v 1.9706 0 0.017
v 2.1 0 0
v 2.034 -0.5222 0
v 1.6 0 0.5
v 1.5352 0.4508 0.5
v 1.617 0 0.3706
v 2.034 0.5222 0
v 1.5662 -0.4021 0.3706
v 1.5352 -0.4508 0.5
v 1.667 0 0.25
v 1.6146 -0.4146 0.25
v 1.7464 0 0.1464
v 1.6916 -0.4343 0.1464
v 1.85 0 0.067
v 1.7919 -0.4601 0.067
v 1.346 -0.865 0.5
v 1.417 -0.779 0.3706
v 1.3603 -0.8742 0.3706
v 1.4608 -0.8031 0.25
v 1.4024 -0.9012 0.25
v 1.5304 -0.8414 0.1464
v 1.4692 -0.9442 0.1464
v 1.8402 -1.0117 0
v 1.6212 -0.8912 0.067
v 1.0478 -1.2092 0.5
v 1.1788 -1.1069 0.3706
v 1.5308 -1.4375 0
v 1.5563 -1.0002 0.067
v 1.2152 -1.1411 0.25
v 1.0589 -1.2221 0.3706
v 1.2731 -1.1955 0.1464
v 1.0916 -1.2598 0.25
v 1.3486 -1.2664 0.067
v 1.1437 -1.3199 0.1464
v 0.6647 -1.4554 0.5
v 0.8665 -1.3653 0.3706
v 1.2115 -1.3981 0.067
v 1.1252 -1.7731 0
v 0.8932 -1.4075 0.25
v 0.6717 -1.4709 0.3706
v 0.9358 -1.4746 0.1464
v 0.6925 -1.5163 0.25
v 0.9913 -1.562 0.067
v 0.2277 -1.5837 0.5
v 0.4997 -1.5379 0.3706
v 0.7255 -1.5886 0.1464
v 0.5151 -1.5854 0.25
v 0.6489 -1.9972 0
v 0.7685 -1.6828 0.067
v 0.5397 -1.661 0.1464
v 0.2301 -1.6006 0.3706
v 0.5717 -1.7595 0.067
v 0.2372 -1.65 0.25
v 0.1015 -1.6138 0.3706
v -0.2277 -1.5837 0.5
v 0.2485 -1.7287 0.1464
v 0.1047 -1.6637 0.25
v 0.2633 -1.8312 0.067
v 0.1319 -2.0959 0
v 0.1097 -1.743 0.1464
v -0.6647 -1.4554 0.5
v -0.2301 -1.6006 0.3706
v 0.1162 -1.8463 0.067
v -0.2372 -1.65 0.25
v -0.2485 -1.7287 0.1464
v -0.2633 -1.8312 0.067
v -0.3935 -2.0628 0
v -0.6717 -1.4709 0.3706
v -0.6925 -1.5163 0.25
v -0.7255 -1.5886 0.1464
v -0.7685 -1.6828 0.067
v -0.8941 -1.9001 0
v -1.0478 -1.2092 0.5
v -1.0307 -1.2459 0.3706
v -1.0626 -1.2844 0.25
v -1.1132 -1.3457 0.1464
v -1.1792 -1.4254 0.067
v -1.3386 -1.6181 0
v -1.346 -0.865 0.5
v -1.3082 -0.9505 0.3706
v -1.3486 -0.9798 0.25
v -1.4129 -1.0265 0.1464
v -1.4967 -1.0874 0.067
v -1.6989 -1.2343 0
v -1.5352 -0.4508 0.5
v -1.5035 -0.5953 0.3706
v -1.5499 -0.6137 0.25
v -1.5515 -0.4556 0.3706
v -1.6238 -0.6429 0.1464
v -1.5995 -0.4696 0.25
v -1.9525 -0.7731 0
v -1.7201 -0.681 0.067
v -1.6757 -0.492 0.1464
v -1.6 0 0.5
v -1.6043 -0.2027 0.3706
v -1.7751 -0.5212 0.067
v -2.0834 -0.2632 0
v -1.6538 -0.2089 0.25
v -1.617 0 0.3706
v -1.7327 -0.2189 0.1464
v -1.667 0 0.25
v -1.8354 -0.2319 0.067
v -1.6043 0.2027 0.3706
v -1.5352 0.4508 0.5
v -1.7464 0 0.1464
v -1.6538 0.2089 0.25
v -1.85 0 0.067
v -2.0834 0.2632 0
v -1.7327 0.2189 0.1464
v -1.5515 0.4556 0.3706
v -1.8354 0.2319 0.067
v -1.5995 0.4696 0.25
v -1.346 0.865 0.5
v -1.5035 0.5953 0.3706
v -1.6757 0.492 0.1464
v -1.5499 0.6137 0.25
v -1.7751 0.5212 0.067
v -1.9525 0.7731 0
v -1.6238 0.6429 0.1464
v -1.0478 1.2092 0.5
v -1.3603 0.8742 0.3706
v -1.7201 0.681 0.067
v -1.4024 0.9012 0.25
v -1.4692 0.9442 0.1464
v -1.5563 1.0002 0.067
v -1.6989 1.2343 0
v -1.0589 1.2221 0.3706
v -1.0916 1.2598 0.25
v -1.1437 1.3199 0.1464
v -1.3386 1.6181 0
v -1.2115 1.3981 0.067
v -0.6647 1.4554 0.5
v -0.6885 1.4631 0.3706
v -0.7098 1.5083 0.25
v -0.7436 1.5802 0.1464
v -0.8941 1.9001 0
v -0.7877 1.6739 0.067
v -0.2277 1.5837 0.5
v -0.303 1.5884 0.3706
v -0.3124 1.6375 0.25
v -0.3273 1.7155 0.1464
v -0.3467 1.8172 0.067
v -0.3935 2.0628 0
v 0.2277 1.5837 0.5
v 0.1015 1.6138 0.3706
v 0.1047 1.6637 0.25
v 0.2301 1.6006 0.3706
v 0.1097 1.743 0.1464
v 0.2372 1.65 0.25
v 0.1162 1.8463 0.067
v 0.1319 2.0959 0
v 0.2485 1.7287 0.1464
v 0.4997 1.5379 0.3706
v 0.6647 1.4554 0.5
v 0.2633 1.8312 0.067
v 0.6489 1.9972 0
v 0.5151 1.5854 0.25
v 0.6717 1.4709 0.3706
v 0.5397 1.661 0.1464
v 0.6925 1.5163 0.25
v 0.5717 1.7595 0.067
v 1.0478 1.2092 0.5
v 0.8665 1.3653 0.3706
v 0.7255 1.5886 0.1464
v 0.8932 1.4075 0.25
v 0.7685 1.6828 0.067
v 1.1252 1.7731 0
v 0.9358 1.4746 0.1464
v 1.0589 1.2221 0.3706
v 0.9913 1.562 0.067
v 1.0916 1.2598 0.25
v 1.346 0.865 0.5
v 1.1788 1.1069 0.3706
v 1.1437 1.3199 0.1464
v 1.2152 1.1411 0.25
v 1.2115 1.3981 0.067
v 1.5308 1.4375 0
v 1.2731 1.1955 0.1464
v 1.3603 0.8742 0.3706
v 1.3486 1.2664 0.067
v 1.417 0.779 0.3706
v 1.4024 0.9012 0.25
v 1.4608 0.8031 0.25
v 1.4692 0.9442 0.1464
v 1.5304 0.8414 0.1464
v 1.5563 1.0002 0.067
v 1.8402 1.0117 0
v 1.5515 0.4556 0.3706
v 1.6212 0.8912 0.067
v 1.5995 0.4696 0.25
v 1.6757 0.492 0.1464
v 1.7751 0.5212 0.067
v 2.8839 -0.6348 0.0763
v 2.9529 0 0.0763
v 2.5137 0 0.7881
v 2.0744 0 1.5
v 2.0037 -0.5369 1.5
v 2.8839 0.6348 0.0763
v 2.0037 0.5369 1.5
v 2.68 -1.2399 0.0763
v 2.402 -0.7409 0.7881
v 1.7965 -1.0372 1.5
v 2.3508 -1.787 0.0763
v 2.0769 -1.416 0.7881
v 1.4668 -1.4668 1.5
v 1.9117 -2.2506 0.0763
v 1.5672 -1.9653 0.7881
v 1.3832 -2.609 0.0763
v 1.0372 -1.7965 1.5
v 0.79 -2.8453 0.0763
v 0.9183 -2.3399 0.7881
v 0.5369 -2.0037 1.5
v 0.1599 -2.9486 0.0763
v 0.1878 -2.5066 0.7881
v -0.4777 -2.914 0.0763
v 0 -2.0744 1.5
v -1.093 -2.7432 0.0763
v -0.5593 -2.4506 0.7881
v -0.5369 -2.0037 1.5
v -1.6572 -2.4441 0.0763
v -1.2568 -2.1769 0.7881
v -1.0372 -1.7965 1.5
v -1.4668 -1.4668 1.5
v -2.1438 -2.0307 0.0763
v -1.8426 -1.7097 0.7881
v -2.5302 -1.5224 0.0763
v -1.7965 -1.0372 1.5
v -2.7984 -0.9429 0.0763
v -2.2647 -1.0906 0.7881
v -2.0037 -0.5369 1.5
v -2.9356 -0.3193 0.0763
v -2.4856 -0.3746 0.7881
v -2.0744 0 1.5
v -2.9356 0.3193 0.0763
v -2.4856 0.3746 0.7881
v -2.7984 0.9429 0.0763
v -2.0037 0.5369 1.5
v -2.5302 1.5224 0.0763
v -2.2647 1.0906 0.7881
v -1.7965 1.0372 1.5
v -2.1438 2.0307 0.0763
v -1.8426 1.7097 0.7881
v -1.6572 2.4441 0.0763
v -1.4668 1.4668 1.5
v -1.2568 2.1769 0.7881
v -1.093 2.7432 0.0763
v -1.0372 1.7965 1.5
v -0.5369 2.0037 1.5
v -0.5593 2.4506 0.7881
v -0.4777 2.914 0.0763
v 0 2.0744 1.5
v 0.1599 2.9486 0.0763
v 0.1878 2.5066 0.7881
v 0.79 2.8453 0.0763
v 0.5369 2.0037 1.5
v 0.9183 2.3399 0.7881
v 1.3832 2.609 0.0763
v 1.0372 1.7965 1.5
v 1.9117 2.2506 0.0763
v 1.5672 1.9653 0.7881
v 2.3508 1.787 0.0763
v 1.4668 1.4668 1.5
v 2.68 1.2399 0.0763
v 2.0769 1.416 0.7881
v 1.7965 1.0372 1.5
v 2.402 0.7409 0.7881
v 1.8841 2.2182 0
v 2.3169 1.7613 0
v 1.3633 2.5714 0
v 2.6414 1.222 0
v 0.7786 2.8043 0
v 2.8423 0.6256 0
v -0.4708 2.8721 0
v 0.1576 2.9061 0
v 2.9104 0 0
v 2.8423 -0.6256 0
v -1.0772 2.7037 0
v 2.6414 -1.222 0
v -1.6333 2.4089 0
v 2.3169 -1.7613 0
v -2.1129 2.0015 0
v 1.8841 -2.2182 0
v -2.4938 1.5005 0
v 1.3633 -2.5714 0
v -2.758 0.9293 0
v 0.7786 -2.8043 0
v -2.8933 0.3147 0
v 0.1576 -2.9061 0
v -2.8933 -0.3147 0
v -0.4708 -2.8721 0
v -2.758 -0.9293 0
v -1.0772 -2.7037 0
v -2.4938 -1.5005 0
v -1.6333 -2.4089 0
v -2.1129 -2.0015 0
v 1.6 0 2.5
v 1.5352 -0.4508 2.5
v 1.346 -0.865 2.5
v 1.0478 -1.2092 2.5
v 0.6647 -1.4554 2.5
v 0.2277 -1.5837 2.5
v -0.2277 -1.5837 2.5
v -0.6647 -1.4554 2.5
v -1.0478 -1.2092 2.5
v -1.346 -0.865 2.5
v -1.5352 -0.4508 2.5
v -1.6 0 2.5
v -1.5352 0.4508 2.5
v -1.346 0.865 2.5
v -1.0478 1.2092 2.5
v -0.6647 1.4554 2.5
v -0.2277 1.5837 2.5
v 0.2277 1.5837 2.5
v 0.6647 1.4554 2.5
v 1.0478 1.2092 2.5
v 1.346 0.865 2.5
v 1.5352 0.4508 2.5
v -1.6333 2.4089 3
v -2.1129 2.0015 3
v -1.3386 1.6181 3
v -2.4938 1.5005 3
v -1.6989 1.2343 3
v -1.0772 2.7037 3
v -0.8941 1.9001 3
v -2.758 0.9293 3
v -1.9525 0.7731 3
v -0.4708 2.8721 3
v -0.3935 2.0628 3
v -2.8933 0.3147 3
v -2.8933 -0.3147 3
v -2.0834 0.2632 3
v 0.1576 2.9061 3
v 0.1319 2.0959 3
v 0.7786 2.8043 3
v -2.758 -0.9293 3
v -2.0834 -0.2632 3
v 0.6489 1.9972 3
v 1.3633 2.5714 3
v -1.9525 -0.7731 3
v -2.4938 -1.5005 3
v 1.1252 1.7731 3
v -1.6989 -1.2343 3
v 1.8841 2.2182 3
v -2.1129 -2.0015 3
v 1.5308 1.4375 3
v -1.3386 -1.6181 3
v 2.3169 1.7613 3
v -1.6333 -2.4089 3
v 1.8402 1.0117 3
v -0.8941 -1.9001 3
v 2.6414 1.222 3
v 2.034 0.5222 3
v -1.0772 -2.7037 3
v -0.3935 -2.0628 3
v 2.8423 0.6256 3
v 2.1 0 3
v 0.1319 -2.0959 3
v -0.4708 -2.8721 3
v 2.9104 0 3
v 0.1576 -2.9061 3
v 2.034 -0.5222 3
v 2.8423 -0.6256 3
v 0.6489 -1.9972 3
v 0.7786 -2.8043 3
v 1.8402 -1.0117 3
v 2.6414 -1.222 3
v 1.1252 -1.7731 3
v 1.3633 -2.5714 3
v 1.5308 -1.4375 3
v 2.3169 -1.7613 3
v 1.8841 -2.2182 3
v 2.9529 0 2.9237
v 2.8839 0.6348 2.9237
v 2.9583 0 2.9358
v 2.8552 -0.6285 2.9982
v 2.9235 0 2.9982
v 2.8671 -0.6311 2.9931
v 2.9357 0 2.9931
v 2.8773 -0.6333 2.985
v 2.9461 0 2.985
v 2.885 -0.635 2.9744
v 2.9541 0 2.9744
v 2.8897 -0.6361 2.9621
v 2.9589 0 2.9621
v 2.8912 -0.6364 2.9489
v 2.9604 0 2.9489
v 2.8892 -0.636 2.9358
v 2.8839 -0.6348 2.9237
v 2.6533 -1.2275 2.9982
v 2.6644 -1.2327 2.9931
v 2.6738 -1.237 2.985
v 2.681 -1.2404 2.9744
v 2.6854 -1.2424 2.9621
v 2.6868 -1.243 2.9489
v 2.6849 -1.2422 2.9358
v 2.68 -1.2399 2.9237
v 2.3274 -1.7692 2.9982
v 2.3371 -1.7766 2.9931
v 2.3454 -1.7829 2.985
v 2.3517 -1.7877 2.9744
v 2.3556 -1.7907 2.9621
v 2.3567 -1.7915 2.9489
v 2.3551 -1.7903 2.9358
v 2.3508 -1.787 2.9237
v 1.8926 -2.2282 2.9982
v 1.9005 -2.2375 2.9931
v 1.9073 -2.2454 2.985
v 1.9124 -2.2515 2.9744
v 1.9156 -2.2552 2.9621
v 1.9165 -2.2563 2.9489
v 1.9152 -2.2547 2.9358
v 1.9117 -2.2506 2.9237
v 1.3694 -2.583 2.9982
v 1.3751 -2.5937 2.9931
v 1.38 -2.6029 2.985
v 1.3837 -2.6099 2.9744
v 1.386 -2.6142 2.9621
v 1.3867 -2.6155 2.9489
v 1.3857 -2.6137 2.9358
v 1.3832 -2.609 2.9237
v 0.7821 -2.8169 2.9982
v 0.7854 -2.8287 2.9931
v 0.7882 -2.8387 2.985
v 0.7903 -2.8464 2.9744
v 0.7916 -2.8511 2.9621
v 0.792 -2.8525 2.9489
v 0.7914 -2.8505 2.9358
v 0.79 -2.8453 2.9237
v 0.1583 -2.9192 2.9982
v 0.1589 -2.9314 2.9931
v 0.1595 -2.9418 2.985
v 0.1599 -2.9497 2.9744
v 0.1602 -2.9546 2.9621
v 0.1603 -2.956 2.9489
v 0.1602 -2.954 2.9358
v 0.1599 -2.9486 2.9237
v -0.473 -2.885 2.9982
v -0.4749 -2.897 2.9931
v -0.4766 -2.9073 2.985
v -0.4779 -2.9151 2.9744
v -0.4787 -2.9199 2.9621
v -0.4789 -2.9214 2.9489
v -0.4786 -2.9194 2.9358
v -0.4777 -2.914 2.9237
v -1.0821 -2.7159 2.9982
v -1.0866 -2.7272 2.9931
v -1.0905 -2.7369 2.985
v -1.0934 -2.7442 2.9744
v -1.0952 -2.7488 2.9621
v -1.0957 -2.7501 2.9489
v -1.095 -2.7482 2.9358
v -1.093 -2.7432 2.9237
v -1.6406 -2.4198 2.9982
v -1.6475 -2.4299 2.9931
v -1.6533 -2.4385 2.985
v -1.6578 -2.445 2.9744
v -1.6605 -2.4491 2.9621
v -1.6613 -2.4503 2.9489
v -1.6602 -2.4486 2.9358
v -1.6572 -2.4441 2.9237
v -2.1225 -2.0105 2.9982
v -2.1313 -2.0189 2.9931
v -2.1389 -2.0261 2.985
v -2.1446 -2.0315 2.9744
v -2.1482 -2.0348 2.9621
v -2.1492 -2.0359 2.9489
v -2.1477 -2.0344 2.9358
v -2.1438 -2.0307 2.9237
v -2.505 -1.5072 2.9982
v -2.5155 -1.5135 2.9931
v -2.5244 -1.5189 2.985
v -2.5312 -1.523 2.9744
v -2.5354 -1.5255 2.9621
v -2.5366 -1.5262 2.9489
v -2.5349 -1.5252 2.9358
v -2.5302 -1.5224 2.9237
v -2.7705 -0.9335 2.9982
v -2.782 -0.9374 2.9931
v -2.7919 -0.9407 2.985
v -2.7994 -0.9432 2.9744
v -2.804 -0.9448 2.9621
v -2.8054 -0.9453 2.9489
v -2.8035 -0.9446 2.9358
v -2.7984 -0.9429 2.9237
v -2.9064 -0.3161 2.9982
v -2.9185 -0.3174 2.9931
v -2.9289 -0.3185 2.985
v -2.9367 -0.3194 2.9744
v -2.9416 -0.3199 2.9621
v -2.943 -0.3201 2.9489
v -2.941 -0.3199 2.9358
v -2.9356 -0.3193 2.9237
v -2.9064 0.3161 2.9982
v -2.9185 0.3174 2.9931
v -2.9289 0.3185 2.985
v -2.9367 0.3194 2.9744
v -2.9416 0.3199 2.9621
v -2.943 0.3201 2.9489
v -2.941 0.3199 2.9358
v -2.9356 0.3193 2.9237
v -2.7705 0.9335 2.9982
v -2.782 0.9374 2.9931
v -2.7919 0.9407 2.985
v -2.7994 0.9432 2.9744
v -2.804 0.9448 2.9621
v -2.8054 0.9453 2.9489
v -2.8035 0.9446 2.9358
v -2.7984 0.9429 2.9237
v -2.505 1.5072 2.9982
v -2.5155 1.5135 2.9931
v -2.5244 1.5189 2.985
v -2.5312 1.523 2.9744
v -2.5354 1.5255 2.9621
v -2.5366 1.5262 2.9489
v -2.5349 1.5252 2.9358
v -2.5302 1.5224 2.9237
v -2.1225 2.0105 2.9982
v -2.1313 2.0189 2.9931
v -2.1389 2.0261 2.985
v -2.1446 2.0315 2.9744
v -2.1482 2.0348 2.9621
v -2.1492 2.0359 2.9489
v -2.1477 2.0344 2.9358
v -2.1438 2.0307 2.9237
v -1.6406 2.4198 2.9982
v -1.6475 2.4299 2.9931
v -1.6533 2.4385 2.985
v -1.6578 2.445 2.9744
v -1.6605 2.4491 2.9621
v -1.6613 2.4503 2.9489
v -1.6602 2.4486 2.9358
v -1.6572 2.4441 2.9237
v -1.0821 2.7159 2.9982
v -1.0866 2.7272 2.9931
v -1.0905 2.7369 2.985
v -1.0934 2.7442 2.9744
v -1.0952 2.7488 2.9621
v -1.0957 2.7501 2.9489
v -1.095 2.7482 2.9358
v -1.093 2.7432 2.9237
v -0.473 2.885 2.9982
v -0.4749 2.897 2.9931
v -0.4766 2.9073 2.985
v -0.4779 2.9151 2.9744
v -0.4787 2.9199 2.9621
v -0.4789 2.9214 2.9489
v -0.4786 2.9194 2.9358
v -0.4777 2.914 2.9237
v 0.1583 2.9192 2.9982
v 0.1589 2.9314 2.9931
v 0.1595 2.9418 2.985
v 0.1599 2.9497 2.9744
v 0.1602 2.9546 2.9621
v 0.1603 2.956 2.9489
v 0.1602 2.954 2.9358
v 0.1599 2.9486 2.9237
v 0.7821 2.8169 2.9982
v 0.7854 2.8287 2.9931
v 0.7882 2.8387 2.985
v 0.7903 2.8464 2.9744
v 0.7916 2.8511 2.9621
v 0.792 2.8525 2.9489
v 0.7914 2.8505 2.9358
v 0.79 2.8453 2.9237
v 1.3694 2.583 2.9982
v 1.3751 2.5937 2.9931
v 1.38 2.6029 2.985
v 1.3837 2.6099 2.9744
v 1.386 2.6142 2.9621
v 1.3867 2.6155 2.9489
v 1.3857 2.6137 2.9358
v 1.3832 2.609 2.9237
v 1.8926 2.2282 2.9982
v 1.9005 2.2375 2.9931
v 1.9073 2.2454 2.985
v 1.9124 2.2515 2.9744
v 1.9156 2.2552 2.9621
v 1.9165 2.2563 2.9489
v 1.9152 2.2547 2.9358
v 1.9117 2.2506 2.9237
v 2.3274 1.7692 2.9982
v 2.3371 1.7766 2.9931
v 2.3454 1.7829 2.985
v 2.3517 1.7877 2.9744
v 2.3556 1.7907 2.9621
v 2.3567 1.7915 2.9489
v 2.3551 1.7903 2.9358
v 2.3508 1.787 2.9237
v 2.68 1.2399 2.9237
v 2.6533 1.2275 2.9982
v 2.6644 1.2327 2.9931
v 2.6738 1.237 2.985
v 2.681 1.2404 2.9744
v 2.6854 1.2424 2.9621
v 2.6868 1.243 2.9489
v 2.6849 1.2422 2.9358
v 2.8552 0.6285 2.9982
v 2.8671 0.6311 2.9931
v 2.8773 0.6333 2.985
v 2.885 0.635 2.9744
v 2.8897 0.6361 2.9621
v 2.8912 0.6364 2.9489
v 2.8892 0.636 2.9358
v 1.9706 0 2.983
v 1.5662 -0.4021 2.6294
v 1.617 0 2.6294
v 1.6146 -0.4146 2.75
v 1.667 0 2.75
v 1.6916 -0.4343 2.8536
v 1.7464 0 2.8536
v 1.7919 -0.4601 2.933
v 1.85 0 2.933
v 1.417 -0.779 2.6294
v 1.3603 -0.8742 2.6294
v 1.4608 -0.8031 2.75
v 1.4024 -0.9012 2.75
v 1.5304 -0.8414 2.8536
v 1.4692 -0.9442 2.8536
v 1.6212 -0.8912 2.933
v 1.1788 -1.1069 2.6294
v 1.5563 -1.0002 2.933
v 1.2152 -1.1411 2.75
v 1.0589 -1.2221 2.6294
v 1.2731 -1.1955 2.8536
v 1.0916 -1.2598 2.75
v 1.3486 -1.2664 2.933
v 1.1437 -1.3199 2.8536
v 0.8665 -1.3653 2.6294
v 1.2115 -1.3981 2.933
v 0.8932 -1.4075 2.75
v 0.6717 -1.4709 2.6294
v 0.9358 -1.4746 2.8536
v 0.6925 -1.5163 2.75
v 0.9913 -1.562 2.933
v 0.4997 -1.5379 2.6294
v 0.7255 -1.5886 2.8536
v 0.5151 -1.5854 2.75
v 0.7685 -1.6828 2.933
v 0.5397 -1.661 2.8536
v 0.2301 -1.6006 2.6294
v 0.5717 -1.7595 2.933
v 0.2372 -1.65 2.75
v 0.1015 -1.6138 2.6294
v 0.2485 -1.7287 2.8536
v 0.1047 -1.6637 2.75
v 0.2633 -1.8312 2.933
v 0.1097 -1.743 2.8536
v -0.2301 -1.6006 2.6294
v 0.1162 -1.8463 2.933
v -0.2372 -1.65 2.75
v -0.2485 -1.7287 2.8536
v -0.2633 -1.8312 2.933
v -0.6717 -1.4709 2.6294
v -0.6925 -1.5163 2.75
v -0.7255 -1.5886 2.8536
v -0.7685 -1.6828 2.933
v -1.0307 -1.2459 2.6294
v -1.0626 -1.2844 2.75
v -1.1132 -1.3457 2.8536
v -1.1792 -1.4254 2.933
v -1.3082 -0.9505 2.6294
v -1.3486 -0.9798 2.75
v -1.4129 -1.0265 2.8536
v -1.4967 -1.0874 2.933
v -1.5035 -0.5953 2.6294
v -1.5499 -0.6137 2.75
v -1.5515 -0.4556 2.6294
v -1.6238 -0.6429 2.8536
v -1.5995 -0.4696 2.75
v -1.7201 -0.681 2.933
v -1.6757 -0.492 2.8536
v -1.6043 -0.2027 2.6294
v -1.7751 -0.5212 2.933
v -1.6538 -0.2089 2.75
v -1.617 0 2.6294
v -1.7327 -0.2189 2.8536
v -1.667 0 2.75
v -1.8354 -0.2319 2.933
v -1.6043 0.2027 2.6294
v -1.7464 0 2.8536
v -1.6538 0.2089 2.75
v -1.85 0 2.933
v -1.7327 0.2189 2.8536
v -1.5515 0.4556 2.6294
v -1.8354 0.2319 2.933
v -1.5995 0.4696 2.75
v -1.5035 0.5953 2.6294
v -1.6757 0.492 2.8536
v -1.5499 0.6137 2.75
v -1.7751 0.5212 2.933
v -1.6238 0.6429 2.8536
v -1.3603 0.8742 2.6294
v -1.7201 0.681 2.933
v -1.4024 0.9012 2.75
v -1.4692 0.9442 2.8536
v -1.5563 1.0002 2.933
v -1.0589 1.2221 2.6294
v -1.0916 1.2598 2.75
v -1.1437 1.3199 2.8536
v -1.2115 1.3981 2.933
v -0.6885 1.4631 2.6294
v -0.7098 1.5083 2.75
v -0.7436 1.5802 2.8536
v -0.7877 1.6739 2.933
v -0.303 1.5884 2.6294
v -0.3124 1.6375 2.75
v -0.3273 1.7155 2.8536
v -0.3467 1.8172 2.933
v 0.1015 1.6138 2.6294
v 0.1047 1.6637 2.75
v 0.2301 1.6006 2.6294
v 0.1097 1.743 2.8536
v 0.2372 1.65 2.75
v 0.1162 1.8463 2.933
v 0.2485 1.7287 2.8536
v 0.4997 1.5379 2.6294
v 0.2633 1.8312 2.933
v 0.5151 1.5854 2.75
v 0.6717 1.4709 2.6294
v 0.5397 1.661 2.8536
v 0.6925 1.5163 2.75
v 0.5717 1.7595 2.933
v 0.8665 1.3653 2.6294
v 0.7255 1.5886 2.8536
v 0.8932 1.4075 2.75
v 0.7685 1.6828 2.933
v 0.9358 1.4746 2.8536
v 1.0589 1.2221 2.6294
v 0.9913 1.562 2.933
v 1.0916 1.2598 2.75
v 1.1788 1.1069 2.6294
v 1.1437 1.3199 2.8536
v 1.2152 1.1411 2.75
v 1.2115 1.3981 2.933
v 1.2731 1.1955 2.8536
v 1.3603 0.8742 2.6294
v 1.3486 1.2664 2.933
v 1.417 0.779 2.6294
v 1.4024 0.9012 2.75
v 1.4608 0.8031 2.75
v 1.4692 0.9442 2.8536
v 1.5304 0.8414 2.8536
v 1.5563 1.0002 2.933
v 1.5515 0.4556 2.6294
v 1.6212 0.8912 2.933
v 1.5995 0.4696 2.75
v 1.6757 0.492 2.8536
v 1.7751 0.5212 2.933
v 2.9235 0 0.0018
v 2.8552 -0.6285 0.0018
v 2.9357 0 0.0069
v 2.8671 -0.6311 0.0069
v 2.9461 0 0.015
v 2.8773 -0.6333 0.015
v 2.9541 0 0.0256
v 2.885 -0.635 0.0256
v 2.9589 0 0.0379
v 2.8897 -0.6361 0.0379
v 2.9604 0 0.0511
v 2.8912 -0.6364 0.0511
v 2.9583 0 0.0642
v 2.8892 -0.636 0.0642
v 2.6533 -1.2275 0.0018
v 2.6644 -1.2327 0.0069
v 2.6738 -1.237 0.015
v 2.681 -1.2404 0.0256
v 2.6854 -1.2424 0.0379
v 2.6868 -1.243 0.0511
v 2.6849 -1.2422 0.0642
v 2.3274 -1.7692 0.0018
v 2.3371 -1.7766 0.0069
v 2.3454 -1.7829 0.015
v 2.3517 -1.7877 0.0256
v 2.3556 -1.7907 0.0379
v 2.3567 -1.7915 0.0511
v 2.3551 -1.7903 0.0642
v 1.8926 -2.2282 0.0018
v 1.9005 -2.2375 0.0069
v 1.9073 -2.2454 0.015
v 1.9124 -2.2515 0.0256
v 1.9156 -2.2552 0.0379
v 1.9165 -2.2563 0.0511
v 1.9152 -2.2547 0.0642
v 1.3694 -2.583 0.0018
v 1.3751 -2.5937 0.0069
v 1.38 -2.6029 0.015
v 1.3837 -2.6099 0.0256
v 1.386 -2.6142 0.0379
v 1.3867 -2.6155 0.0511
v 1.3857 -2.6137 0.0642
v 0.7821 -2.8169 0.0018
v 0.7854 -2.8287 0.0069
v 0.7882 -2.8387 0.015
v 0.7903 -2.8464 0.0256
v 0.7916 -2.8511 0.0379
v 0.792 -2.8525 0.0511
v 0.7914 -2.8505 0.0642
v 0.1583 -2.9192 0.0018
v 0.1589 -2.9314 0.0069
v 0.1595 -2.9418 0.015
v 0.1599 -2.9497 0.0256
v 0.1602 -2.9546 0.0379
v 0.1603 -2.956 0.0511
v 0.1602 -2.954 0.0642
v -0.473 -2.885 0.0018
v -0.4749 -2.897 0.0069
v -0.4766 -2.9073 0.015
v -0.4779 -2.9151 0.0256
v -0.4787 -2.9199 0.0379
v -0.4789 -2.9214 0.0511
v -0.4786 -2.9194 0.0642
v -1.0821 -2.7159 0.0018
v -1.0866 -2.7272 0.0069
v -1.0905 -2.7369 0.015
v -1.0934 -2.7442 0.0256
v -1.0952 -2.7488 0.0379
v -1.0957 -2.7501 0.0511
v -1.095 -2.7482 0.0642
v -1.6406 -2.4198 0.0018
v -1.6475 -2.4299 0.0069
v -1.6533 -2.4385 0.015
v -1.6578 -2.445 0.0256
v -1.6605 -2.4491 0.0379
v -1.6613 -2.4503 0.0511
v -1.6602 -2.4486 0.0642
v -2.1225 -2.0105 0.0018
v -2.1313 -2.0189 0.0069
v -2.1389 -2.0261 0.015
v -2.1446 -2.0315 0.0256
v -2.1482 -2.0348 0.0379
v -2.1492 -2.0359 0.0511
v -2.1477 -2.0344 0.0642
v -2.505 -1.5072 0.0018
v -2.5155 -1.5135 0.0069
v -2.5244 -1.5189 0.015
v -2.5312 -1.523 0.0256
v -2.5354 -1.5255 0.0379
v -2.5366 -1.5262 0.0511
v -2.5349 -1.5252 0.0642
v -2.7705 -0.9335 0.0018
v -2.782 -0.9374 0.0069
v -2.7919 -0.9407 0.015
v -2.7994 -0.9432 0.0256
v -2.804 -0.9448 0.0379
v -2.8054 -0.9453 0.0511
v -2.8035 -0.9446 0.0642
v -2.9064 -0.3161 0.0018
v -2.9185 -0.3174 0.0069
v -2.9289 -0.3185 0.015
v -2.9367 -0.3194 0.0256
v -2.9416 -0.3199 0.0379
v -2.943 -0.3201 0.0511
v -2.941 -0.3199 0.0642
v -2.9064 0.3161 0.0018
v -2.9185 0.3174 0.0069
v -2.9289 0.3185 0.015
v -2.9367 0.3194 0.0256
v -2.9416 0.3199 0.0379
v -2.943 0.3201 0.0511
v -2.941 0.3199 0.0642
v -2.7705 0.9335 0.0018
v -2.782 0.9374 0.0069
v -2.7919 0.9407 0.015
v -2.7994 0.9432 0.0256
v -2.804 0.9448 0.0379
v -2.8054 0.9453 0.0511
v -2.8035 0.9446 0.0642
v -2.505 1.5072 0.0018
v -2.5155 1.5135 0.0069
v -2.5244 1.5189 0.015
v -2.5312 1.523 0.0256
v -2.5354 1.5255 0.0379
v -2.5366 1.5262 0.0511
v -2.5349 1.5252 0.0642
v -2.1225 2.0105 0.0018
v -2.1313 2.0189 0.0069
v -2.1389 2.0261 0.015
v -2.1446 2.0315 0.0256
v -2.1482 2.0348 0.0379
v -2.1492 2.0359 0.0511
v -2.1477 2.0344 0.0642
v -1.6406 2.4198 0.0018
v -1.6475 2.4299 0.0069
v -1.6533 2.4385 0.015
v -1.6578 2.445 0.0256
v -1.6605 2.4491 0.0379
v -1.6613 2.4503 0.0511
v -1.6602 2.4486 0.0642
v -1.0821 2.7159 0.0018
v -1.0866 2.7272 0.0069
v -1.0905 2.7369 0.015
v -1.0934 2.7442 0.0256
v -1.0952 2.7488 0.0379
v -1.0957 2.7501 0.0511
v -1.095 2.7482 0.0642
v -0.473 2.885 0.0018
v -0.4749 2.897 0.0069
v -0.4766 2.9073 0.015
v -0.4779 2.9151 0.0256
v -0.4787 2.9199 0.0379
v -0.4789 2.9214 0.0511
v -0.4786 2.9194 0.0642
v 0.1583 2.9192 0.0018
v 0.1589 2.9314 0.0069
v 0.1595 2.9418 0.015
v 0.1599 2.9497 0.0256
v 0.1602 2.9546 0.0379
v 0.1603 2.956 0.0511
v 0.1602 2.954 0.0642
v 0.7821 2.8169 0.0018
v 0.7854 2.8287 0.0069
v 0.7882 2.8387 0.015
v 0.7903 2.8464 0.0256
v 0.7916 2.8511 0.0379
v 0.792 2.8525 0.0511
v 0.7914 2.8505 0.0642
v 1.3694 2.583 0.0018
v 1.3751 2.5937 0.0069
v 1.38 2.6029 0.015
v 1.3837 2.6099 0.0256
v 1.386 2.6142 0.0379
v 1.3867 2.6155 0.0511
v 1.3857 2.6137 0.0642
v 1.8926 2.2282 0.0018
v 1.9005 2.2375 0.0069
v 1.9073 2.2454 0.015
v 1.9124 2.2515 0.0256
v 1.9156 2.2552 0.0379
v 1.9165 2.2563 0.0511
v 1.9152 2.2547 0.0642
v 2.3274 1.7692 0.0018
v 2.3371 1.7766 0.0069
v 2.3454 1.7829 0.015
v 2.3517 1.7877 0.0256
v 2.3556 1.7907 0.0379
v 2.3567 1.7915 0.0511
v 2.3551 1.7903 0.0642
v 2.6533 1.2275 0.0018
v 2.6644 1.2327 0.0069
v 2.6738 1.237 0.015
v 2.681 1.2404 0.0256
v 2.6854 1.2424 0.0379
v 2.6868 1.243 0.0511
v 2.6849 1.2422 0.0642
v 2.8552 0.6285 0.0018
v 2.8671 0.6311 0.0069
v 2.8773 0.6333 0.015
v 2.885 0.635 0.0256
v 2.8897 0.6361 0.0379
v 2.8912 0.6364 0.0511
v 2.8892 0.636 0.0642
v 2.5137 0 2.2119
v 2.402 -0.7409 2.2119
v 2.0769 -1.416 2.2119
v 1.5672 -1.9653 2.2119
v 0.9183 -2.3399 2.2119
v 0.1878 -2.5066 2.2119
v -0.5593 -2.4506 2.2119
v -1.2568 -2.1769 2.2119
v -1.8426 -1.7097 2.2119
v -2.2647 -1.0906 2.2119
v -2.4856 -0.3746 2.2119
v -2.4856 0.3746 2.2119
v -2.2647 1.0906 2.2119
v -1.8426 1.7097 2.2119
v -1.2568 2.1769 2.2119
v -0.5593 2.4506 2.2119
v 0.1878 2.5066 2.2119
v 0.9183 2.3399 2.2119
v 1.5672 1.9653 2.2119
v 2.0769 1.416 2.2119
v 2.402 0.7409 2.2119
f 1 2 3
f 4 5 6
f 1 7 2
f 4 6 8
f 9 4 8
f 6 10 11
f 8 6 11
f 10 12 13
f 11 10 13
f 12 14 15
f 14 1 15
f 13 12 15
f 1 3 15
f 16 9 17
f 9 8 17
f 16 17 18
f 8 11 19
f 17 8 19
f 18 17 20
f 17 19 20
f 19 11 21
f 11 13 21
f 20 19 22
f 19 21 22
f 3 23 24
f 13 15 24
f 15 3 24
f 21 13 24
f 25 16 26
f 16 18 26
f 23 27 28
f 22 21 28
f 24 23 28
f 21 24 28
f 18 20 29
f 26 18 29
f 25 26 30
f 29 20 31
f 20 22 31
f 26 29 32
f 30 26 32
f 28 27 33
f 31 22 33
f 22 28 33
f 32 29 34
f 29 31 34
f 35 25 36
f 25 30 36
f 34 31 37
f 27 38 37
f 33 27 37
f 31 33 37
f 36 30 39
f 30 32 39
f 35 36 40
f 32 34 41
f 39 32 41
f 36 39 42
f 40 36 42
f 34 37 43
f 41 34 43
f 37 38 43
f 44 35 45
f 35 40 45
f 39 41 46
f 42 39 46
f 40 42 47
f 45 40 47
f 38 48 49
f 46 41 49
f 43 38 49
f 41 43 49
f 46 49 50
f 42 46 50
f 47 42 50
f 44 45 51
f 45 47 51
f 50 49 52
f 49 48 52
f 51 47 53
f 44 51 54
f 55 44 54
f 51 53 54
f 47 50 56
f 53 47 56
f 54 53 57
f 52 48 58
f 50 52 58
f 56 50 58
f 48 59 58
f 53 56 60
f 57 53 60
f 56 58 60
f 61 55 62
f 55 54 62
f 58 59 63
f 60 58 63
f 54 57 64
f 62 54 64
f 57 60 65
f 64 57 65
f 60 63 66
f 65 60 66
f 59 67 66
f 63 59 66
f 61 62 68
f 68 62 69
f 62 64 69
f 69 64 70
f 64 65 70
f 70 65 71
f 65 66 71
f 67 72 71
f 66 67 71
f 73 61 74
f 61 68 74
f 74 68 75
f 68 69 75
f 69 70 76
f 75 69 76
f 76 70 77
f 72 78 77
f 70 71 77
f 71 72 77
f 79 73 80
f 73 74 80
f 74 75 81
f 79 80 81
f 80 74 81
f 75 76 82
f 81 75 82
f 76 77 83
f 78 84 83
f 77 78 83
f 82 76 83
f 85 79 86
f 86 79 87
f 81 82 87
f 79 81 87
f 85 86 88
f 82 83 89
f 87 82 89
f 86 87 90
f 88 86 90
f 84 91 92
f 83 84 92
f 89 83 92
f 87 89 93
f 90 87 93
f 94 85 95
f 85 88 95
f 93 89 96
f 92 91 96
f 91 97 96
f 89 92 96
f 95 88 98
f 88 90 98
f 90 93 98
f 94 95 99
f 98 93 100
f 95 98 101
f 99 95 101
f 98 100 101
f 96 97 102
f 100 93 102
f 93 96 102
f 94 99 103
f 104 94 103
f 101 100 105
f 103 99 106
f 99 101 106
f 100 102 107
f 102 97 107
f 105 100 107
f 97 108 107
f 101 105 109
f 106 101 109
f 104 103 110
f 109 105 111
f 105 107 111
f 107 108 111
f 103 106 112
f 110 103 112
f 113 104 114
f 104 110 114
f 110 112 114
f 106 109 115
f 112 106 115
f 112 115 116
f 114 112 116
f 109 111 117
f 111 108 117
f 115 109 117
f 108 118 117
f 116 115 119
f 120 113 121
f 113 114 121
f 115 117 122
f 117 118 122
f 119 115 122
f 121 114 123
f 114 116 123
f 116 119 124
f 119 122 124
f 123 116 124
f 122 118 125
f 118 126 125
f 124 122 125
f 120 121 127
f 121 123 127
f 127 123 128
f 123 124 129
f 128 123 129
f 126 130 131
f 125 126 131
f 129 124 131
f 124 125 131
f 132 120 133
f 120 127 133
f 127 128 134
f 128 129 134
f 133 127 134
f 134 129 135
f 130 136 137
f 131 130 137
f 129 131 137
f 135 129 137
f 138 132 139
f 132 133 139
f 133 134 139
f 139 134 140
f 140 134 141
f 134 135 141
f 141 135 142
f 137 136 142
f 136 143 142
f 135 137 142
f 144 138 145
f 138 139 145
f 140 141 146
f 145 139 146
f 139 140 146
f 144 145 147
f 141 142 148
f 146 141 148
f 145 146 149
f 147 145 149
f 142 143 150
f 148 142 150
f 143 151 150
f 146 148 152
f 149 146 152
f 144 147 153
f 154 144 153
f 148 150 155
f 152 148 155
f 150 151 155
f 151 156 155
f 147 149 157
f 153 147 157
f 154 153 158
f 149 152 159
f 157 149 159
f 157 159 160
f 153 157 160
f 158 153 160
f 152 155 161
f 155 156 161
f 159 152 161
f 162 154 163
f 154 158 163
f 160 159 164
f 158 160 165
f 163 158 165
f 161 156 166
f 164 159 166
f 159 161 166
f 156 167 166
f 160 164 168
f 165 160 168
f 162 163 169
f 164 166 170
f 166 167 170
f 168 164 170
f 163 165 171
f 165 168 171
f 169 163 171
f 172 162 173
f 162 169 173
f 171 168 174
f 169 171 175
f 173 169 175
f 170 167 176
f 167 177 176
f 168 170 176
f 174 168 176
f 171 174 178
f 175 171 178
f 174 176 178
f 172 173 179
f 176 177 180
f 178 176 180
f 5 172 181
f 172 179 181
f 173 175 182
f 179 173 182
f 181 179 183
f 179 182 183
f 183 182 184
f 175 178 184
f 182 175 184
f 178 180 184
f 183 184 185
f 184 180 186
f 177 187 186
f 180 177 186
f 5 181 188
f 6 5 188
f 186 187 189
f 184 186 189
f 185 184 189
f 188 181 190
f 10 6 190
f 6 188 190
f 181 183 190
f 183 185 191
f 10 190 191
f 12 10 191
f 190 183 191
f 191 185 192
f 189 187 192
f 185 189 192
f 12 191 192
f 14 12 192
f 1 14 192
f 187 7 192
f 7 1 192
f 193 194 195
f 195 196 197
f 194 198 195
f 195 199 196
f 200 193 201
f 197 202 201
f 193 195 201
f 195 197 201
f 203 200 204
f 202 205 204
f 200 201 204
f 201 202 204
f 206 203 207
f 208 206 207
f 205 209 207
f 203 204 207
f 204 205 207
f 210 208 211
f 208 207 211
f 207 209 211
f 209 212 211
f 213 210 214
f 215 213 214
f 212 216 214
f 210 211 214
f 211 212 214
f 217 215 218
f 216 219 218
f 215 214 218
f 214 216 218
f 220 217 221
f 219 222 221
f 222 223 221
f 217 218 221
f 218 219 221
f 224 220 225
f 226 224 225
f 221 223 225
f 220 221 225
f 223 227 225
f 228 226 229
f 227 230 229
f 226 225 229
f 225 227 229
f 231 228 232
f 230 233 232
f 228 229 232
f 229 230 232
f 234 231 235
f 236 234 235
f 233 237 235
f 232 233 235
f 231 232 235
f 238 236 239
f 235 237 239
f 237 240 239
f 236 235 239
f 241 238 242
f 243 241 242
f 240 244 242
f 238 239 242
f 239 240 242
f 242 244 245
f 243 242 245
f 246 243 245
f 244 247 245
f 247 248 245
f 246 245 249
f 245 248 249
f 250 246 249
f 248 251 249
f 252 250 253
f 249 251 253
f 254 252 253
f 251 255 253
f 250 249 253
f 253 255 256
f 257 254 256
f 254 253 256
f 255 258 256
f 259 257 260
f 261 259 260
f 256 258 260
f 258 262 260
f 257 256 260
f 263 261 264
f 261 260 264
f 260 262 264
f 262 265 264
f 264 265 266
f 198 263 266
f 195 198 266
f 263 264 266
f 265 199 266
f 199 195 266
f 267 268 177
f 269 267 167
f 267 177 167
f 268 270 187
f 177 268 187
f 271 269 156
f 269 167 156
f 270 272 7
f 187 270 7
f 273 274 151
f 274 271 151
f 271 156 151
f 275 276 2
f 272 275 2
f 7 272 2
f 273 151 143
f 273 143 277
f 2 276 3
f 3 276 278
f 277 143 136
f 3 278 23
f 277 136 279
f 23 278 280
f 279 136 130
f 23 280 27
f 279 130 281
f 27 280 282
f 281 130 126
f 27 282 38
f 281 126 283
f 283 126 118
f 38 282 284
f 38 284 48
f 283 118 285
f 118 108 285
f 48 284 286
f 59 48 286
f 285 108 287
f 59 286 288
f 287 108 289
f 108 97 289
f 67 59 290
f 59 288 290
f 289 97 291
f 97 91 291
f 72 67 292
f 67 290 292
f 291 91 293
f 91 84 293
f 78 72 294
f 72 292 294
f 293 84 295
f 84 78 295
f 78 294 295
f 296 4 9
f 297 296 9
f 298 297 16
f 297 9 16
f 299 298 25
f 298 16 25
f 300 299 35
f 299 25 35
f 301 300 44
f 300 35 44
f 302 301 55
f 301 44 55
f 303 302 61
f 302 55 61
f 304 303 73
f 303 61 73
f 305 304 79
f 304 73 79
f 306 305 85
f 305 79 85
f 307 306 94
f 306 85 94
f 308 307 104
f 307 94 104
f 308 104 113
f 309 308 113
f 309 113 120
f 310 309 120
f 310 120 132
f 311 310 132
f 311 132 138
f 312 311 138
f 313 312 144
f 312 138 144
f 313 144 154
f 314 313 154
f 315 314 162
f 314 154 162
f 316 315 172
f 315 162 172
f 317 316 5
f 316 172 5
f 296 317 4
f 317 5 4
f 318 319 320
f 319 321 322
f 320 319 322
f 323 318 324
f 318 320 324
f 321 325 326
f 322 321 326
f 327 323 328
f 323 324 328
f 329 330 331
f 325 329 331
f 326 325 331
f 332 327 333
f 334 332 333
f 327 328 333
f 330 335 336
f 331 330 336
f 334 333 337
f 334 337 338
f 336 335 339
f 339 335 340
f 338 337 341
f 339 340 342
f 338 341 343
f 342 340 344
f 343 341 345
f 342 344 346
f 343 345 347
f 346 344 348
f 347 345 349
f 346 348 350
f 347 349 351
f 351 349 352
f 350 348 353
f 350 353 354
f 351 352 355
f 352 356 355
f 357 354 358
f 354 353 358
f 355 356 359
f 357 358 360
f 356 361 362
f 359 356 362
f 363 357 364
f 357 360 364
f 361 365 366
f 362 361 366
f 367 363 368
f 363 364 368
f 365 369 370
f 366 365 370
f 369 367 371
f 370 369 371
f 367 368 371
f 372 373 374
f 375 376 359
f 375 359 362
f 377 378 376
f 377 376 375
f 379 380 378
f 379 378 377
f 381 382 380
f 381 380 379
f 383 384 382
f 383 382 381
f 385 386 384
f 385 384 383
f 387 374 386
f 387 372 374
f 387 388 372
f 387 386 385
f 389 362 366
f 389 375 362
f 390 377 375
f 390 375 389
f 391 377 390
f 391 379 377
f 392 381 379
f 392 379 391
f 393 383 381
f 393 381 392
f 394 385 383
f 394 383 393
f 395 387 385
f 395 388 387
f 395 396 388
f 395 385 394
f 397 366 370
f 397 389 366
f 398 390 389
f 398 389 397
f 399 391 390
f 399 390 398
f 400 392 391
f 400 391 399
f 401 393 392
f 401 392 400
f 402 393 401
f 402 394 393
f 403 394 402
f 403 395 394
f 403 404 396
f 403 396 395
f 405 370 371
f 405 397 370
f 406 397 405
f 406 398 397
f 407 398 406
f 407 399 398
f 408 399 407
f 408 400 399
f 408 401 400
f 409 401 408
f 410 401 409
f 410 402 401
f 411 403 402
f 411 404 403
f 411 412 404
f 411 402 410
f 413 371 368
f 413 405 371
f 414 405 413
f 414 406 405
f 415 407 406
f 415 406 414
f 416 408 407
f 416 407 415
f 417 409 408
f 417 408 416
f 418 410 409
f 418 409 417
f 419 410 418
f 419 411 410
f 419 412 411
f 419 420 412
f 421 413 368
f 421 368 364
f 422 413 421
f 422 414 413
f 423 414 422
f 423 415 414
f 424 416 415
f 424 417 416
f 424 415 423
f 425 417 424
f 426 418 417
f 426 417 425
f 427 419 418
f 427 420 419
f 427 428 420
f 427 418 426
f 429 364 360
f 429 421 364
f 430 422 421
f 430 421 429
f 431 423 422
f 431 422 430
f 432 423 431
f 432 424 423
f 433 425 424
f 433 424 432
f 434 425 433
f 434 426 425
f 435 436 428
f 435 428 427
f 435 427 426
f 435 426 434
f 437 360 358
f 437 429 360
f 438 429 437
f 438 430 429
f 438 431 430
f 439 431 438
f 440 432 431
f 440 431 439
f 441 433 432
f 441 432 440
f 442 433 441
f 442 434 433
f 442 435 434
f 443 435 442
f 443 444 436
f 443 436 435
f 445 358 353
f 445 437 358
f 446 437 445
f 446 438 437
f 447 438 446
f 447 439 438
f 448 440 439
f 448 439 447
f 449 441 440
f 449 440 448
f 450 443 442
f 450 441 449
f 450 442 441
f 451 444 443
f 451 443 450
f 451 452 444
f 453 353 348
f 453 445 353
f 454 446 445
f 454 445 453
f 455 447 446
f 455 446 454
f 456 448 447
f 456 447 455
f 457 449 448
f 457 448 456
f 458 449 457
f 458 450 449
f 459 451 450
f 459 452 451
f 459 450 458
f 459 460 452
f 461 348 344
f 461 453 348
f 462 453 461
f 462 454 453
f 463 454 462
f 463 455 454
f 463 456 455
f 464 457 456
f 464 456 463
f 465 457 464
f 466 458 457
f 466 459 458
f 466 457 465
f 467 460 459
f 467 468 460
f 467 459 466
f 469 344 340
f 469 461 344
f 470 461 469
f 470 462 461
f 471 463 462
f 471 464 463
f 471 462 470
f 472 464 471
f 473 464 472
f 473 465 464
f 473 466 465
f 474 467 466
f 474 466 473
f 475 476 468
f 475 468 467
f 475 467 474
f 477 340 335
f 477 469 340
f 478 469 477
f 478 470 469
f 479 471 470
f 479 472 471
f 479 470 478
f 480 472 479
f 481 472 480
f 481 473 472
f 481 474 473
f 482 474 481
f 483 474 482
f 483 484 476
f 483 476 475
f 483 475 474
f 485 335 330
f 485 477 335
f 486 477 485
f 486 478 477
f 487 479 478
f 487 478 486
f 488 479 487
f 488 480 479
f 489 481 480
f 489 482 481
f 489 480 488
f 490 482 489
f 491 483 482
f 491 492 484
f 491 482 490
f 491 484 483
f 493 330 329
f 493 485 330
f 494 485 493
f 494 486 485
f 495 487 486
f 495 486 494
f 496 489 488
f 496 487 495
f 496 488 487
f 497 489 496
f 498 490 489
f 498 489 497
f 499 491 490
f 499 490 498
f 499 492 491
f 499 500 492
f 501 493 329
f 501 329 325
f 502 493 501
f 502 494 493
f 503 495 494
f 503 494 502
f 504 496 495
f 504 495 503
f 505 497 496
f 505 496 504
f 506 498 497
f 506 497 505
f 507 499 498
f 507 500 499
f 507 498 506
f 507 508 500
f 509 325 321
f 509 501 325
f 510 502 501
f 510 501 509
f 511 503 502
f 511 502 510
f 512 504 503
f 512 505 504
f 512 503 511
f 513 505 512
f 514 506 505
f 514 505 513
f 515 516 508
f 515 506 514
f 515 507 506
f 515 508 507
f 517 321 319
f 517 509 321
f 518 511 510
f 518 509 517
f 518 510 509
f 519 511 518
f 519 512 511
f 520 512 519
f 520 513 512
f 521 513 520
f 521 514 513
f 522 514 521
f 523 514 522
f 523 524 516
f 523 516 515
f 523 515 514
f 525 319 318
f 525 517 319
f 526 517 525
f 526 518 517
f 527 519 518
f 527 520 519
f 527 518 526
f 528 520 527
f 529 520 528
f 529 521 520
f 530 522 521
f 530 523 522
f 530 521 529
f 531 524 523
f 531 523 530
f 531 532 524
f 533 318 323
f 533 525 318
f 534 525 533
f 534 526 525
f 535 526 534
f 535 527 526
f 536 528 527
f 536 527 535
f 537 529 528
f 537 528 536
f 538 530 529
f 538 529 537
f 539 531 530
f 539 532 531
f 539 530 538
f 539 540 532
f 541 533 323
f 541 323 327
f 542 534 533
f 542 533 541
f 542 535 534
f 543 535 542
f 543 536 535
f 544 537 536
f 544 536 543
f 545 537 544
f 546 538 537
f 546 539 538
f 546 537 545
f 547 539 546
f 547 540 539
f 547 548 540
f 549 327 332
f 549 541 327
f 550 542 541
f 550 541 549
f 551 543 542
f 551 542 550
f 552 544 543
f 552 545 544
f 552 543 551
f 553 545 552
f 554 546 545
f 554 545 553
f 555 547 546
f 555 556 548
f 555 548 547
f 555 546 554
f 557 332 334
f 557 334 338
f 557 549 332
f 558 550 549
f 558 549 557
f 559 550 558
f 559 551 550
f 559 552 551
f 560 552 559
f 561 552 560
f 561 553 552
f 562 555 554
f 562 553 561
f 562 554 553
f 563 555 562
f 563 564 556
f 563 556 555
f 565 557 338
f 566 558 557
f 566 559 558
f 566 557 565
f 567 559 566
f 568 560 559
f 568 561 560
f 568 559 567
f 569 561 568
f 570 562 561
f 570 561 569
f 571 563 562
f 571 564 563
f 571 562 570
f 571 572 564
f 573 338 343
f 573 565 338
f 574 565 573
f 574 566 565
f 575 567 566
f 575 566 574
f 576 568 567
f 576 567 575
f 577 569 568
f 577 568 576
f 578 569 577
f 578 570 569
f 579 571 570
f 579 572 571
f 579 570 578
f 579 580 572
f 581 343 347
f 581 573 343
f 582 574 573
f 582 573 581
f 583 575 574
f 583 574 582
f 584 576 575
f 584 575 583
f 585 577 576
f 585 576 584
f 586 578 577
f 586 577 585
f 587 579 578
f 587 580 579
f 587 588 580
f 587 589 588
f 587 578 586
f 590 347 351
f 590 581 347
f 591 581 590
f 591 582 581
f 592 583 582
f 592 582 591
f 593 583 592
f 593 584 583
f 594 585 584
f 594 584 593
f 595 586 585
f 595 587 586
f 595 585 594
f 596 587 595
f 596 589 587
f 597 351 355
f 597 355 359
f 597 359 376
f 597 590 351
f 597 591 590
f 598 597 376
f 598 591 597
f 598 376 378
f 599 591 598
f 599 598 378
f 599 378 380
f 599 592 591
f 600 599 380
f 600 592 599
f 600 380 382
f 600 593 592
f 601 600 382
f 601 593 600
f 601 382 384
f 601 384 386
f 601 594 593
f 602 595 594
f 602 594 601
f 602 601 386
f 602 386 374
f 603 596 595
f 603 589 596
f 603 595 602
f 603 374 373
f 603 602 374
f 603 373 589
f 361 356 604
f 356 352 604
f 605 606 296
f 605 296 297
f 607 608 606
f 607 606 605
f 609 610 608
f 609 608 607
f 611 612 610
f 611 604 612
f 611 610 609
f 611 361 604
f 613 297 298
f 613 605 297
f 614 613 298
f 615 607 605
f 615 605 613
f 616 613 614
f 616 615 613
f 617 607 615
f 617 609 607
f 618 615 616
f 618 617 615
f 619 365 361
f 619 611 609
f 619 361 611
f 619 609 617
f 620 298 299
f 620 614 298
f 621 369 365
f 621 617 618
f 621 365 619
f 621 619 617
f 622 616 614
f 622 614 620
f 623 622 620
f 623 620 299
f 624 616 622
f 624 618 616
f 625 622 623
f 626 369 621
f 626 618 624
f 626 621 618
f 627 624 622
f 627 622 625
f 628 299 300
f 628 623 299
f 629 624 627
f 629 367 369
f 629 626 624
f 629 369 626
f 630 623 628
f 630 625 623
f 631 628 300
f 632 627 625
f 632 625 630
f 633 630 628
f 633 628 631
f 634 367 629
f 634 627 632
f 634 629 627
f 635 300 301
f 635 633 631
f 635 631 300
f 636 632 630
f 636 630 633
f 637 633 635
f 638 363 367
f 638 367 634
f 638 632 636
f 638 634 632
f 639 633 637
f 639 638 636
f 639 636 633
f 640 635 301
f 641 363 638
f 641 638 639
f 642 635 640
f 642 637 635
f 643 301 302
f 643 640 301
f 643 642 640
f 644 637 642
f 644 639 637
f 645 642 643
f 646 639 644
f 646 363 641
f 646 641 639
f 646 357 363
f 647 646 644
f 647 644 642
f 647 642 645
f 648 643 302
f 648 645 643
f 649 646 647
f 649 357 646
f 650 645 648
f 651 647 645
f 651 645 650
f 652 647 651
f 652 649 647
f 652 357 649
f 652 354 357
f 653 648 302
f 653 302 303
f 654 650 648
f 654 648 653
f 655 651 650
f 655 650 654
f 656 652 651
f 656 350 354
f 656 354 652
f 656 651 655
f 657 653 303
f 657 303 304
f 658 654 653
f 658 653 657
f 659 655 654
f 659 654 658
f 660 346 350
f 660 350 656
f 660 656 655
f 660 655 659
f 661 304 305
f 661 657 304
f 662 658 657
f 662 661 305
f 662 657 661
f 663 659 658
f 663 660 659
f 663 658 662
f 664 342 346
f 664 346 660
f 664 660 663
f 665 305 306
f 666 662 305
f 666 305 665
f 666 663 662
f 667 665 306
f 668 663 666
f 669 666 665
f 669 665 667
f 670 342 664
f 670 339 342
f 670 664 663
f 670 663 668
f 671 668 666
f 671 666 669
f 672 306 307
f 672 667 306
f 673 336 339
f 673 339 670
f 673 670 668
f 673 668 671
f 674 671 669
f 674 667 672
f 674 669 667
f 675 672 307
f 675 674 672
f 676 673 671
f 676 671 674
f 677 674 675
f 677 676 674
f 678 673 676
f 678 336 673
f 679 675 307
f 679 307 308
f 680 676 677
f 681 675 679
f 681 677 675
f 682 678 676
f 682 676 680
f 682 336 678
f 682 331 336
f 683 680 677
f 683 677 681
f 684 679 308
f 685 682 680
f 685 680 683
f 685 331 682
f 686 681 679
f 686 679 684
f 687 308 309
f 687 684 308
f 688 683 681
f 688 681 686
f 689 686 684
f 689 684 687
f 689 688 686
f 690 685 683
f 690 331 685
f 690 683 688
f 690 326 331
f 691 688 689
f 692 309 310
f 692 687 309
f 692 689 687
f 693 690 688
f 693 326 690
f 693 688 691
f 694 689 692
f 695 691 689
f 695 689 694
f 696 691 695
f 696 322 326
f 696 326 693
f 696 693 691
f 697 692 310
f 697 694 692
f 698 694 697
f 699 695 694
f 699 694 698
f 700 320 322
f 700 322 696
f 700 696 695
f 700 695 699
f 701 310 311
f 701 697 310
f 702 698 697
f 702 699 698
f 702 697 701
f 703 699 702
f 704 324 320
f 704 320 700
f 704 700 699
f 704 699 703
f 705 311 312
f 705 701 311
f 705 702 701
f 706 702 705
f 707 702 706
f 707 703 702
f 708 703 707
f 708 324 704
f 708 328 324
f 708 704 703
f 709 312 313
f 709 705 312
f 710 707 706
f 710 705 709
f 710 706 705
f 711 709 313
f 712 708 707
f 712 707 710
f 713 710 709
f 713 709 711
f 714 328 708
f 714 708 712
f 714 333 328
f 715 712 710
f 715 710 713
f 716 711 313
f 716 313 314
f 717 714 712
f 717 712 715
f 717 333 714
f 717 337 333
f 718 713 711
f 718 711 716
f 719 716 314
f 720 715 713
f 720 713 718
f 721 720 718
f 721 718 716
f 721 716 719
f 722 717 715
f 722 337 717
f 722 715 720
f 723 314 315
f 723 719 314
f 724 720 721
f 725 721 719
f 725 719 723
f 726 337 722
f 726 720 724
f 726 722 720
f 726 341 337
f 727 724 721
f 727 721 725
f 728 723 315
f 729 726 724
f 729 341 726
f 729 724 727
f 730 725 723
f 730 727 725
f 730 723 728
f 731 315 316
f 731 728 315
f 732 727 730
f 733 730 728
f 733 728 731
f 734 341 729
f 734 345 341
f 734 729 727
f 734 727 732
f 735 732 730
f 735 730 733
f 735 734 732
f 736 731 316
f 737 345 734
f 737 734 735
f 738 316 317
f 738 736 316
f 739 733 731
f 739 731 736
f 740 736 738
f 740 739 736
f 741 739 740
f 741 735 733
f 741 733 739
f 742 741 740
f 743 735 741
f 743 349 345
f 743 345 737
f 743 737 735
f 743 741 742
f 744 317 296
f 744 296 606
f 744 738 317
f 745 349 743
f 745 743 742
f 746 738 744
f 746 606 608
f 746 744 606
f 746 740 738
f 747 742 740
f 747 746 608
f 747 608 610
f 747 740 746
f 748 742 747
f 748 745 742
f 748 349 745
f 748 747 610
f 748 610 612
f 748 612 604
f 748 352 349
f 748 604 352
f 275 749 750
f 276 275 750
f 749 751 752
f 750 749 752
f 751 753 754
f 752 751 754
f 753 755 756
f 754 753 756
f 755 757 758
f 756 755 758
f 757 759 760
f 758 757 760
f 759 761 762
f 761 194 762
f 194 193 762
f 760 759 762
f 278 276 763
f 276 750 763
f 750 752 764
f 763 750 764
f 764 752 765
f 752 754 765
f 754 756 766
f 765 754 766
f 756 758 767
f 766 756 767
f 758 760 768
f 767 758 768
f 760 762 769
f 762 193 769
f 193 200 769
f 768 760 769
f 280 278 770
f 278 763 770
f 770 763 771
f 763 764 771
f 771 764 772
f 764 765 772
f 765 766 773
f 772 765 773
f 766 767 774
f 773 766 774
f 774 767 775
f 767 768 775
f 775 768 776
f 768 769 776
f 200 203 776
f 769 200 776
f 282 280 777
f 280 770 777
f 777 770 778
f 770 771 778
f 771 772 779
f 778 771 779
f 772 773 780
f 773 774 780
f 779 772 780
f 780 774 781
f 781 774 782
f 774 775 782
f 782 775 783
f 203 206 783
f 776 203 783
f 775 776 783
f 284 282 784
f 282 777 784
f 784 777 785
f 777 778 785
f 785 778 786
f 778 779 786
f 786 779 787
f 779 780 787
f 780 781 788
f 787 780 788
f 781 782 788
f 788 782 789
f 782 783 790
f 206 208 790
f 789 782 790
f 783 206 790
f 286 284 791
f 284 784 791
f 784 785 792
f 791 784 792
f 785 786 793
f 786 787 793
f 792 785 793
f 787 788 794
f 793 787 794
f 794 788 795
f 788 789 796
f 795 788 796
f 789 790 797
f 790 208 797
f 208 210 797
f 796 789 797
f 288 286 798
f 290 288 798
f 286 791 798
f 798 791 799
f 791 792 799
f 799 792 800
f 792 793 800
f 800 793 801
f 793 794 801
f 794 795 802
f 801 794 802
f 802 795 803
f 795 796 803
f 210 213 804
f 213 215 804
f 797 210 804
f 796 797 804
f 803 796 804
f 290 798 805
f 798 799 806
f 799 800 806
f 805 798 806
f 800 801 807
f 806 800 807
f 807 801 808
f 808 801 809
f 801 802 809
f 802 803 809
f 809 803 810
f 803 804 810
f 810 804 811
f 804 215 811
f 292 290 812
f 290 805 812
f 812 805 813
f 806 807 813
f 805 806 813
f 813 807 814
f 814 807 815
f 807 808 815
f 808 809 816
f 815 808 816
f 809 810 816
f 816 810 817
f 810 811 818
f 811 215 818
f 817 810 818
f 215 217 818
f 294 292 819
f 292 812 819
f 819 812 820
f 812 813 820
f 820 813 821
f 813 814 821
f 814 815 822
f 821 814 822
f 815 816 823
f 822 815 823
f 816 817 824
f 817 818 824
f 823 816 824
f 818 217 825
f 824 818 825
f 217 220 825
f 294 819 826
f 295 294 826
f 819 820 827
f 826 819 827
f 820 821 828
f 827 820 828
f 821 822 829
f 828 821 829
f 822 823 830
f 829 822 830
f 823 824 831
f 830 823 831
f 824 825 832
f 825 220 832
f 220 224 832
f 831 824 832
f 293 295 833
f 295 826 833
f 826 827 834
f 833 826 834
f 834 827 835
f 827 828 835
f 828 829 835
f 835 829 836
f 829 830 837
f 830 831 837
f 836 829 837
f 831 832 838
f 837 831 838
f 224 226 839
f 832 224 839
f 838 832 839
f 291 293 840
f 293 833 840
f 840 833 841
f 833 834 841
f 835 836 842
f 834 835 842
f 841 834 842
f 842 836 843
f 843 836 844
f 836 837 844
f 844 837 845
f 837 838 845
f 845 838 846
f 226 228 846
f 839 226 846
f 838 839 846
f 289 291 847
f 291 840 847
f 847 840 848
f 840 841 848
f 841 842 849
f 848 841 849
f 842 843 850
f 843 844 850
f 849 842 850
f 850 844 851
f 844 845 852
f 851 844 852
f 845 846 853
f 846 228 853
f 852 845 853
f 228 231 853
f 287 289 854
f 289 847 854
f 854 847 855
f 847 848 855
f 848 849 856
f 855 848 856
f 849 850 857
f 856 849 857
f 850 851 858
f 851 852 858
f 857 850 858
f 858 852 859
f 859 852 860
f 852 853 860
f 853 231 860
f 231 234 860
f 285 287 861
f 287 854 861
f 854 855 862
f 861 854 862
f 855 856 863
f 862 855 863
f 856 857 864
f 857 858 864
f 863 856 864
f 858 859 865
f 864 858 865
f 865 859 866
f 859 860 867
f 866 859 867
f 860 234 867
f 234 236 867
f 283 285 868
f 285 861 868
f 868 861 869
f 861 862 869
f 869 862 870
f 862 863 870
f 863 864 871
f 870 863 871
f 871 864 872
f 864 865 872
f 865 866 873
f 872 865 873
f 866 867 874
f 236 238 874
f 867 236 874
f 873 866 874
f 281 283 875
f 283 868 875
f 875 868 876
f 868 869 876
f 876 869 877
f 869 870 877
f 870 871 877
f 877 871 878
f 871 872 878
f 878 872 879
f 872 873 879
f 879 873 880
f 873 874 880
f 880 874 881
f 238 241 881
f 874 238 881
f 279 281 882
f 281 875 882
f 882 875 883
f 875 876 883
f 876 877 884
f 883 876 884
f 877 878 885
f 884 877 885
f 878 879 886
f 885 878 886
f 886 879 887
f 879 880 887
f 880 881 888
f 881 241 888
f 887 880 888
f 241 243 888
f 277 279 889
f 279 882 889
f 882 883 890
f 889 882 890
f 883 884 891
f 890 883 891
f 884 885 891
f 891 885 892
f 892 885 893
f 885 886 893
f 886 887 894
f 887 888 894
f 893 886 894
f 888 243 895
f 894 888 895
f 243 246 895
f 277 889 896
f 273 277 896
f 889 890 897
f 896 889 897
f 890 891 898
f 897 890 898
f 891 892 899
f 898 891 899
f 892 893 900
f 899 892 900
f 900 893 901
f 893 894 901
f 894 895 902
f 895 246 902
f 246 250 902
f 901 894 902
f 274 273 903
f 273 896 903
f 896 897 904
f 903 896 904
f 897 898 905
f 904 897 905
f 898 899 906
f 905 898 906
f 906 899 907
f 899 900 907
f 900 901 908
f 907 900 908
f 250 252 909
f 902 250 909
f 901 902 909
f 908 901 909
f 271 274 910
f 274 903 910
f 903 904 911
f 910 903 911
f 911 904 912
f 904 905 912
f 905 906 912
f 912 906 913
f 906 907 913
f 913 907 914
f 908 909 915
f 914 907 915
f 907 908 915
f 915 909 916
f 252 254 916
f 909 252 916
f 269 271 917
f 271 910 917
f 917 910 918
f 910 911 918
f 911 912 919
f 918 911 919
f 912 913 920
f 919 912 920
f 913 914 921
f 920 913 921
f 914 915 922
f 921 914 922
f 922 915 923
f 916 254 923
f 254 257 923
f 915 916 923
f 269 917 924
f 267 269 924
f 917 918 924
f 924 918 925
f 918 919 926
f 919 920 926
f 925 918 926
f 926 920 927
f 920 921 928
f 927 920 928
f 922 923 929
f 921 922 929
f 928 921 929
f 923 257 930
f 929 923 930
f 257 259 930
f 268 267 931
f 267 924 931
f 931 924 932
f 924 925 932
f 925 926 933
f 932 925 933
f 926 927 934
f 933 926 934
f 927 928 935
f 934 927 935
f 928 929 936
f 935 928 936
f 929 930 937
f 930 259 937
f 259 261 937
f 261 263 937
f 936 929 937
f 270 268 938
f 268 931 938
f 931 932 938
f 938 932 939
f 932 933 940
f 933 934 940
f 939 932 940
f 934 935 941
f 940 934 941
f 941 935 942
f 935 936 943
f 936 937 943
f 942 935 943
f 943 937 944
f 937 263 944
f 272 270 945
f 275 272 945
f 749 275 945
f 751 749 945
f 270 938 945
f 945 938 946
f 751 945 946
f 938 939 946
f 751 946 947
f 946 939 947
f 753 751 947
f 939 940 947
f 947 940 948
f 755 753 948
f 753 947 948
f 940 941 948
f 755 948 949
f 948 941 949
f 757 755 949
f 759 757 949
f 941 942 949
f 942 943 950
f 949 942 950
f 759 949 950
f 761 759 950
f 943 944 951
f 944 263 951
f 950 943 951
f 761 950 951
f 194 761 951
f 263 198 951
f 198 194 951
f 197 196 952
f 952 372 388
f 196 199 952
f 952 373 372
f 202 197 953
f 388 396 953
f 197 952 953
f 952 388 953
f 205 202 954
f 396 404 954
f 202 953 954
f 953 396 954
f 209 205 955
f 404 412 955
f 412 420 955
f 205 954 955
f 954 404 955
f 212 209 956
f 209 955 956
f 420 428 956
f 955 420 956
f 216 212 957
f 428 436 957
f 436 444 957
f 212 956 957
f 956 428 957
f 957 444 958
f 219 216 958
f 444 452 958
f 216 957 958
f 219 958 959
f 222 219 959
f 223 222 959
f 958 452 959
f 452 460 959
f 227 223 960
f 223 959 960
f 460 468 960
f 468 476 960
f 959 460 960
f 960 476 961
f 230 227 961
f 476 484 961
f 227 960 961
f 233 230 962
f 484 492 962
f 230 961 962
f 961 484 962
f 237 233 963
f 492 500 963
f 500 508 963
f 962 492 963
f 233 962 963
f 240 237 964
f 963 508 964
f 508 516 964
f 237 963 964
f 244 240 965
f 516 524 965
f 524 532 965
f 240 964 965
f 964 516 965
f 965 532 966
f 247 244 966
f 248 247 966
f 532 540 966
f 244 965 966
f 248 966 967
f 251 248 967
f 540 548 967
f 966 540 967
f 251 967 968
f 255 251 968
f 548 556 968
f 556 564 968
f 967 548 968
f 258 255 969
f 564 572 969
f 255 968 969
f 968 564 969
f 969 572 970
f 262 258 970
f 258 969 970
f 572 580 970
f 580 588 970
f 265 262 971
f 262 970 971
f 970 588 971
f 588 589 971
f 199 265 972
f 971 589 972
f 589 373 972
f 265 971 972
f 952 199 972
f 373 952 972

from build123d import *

# Parameters (mm, degrees)
F2_R = 0.5
F3_R = 0.05


with BuildPart() as f1:
    # F0 (on Front) → F1 (revolve)
    with BuildSketch(Plane.XZ):
        Polygon((1.6, 3), (1.6, 0), (3, 0), (2.0743638743, 1.5), (3, 3), align=None)
    revolve(axis=Axis((0, 0, 1.4736446901), (0, 0, -1)))

    # F2
    f2_edges = [f1.edges().sort_by_distance(p)[0] for p in [
        (-1.6, 0, 3),
        (-1.6, 0, 0),
    ]]
    fillet(f2_edges, radius=F2_R)

    # F3
    f3_edges = [f1.edges().sort_by_distance(p)[0] for p in [
        (-3, 0, 3),
        (-3, 0, 0),
    ]]
    fillet(f3_edges, radius=F3_R)


solid = f1.part
